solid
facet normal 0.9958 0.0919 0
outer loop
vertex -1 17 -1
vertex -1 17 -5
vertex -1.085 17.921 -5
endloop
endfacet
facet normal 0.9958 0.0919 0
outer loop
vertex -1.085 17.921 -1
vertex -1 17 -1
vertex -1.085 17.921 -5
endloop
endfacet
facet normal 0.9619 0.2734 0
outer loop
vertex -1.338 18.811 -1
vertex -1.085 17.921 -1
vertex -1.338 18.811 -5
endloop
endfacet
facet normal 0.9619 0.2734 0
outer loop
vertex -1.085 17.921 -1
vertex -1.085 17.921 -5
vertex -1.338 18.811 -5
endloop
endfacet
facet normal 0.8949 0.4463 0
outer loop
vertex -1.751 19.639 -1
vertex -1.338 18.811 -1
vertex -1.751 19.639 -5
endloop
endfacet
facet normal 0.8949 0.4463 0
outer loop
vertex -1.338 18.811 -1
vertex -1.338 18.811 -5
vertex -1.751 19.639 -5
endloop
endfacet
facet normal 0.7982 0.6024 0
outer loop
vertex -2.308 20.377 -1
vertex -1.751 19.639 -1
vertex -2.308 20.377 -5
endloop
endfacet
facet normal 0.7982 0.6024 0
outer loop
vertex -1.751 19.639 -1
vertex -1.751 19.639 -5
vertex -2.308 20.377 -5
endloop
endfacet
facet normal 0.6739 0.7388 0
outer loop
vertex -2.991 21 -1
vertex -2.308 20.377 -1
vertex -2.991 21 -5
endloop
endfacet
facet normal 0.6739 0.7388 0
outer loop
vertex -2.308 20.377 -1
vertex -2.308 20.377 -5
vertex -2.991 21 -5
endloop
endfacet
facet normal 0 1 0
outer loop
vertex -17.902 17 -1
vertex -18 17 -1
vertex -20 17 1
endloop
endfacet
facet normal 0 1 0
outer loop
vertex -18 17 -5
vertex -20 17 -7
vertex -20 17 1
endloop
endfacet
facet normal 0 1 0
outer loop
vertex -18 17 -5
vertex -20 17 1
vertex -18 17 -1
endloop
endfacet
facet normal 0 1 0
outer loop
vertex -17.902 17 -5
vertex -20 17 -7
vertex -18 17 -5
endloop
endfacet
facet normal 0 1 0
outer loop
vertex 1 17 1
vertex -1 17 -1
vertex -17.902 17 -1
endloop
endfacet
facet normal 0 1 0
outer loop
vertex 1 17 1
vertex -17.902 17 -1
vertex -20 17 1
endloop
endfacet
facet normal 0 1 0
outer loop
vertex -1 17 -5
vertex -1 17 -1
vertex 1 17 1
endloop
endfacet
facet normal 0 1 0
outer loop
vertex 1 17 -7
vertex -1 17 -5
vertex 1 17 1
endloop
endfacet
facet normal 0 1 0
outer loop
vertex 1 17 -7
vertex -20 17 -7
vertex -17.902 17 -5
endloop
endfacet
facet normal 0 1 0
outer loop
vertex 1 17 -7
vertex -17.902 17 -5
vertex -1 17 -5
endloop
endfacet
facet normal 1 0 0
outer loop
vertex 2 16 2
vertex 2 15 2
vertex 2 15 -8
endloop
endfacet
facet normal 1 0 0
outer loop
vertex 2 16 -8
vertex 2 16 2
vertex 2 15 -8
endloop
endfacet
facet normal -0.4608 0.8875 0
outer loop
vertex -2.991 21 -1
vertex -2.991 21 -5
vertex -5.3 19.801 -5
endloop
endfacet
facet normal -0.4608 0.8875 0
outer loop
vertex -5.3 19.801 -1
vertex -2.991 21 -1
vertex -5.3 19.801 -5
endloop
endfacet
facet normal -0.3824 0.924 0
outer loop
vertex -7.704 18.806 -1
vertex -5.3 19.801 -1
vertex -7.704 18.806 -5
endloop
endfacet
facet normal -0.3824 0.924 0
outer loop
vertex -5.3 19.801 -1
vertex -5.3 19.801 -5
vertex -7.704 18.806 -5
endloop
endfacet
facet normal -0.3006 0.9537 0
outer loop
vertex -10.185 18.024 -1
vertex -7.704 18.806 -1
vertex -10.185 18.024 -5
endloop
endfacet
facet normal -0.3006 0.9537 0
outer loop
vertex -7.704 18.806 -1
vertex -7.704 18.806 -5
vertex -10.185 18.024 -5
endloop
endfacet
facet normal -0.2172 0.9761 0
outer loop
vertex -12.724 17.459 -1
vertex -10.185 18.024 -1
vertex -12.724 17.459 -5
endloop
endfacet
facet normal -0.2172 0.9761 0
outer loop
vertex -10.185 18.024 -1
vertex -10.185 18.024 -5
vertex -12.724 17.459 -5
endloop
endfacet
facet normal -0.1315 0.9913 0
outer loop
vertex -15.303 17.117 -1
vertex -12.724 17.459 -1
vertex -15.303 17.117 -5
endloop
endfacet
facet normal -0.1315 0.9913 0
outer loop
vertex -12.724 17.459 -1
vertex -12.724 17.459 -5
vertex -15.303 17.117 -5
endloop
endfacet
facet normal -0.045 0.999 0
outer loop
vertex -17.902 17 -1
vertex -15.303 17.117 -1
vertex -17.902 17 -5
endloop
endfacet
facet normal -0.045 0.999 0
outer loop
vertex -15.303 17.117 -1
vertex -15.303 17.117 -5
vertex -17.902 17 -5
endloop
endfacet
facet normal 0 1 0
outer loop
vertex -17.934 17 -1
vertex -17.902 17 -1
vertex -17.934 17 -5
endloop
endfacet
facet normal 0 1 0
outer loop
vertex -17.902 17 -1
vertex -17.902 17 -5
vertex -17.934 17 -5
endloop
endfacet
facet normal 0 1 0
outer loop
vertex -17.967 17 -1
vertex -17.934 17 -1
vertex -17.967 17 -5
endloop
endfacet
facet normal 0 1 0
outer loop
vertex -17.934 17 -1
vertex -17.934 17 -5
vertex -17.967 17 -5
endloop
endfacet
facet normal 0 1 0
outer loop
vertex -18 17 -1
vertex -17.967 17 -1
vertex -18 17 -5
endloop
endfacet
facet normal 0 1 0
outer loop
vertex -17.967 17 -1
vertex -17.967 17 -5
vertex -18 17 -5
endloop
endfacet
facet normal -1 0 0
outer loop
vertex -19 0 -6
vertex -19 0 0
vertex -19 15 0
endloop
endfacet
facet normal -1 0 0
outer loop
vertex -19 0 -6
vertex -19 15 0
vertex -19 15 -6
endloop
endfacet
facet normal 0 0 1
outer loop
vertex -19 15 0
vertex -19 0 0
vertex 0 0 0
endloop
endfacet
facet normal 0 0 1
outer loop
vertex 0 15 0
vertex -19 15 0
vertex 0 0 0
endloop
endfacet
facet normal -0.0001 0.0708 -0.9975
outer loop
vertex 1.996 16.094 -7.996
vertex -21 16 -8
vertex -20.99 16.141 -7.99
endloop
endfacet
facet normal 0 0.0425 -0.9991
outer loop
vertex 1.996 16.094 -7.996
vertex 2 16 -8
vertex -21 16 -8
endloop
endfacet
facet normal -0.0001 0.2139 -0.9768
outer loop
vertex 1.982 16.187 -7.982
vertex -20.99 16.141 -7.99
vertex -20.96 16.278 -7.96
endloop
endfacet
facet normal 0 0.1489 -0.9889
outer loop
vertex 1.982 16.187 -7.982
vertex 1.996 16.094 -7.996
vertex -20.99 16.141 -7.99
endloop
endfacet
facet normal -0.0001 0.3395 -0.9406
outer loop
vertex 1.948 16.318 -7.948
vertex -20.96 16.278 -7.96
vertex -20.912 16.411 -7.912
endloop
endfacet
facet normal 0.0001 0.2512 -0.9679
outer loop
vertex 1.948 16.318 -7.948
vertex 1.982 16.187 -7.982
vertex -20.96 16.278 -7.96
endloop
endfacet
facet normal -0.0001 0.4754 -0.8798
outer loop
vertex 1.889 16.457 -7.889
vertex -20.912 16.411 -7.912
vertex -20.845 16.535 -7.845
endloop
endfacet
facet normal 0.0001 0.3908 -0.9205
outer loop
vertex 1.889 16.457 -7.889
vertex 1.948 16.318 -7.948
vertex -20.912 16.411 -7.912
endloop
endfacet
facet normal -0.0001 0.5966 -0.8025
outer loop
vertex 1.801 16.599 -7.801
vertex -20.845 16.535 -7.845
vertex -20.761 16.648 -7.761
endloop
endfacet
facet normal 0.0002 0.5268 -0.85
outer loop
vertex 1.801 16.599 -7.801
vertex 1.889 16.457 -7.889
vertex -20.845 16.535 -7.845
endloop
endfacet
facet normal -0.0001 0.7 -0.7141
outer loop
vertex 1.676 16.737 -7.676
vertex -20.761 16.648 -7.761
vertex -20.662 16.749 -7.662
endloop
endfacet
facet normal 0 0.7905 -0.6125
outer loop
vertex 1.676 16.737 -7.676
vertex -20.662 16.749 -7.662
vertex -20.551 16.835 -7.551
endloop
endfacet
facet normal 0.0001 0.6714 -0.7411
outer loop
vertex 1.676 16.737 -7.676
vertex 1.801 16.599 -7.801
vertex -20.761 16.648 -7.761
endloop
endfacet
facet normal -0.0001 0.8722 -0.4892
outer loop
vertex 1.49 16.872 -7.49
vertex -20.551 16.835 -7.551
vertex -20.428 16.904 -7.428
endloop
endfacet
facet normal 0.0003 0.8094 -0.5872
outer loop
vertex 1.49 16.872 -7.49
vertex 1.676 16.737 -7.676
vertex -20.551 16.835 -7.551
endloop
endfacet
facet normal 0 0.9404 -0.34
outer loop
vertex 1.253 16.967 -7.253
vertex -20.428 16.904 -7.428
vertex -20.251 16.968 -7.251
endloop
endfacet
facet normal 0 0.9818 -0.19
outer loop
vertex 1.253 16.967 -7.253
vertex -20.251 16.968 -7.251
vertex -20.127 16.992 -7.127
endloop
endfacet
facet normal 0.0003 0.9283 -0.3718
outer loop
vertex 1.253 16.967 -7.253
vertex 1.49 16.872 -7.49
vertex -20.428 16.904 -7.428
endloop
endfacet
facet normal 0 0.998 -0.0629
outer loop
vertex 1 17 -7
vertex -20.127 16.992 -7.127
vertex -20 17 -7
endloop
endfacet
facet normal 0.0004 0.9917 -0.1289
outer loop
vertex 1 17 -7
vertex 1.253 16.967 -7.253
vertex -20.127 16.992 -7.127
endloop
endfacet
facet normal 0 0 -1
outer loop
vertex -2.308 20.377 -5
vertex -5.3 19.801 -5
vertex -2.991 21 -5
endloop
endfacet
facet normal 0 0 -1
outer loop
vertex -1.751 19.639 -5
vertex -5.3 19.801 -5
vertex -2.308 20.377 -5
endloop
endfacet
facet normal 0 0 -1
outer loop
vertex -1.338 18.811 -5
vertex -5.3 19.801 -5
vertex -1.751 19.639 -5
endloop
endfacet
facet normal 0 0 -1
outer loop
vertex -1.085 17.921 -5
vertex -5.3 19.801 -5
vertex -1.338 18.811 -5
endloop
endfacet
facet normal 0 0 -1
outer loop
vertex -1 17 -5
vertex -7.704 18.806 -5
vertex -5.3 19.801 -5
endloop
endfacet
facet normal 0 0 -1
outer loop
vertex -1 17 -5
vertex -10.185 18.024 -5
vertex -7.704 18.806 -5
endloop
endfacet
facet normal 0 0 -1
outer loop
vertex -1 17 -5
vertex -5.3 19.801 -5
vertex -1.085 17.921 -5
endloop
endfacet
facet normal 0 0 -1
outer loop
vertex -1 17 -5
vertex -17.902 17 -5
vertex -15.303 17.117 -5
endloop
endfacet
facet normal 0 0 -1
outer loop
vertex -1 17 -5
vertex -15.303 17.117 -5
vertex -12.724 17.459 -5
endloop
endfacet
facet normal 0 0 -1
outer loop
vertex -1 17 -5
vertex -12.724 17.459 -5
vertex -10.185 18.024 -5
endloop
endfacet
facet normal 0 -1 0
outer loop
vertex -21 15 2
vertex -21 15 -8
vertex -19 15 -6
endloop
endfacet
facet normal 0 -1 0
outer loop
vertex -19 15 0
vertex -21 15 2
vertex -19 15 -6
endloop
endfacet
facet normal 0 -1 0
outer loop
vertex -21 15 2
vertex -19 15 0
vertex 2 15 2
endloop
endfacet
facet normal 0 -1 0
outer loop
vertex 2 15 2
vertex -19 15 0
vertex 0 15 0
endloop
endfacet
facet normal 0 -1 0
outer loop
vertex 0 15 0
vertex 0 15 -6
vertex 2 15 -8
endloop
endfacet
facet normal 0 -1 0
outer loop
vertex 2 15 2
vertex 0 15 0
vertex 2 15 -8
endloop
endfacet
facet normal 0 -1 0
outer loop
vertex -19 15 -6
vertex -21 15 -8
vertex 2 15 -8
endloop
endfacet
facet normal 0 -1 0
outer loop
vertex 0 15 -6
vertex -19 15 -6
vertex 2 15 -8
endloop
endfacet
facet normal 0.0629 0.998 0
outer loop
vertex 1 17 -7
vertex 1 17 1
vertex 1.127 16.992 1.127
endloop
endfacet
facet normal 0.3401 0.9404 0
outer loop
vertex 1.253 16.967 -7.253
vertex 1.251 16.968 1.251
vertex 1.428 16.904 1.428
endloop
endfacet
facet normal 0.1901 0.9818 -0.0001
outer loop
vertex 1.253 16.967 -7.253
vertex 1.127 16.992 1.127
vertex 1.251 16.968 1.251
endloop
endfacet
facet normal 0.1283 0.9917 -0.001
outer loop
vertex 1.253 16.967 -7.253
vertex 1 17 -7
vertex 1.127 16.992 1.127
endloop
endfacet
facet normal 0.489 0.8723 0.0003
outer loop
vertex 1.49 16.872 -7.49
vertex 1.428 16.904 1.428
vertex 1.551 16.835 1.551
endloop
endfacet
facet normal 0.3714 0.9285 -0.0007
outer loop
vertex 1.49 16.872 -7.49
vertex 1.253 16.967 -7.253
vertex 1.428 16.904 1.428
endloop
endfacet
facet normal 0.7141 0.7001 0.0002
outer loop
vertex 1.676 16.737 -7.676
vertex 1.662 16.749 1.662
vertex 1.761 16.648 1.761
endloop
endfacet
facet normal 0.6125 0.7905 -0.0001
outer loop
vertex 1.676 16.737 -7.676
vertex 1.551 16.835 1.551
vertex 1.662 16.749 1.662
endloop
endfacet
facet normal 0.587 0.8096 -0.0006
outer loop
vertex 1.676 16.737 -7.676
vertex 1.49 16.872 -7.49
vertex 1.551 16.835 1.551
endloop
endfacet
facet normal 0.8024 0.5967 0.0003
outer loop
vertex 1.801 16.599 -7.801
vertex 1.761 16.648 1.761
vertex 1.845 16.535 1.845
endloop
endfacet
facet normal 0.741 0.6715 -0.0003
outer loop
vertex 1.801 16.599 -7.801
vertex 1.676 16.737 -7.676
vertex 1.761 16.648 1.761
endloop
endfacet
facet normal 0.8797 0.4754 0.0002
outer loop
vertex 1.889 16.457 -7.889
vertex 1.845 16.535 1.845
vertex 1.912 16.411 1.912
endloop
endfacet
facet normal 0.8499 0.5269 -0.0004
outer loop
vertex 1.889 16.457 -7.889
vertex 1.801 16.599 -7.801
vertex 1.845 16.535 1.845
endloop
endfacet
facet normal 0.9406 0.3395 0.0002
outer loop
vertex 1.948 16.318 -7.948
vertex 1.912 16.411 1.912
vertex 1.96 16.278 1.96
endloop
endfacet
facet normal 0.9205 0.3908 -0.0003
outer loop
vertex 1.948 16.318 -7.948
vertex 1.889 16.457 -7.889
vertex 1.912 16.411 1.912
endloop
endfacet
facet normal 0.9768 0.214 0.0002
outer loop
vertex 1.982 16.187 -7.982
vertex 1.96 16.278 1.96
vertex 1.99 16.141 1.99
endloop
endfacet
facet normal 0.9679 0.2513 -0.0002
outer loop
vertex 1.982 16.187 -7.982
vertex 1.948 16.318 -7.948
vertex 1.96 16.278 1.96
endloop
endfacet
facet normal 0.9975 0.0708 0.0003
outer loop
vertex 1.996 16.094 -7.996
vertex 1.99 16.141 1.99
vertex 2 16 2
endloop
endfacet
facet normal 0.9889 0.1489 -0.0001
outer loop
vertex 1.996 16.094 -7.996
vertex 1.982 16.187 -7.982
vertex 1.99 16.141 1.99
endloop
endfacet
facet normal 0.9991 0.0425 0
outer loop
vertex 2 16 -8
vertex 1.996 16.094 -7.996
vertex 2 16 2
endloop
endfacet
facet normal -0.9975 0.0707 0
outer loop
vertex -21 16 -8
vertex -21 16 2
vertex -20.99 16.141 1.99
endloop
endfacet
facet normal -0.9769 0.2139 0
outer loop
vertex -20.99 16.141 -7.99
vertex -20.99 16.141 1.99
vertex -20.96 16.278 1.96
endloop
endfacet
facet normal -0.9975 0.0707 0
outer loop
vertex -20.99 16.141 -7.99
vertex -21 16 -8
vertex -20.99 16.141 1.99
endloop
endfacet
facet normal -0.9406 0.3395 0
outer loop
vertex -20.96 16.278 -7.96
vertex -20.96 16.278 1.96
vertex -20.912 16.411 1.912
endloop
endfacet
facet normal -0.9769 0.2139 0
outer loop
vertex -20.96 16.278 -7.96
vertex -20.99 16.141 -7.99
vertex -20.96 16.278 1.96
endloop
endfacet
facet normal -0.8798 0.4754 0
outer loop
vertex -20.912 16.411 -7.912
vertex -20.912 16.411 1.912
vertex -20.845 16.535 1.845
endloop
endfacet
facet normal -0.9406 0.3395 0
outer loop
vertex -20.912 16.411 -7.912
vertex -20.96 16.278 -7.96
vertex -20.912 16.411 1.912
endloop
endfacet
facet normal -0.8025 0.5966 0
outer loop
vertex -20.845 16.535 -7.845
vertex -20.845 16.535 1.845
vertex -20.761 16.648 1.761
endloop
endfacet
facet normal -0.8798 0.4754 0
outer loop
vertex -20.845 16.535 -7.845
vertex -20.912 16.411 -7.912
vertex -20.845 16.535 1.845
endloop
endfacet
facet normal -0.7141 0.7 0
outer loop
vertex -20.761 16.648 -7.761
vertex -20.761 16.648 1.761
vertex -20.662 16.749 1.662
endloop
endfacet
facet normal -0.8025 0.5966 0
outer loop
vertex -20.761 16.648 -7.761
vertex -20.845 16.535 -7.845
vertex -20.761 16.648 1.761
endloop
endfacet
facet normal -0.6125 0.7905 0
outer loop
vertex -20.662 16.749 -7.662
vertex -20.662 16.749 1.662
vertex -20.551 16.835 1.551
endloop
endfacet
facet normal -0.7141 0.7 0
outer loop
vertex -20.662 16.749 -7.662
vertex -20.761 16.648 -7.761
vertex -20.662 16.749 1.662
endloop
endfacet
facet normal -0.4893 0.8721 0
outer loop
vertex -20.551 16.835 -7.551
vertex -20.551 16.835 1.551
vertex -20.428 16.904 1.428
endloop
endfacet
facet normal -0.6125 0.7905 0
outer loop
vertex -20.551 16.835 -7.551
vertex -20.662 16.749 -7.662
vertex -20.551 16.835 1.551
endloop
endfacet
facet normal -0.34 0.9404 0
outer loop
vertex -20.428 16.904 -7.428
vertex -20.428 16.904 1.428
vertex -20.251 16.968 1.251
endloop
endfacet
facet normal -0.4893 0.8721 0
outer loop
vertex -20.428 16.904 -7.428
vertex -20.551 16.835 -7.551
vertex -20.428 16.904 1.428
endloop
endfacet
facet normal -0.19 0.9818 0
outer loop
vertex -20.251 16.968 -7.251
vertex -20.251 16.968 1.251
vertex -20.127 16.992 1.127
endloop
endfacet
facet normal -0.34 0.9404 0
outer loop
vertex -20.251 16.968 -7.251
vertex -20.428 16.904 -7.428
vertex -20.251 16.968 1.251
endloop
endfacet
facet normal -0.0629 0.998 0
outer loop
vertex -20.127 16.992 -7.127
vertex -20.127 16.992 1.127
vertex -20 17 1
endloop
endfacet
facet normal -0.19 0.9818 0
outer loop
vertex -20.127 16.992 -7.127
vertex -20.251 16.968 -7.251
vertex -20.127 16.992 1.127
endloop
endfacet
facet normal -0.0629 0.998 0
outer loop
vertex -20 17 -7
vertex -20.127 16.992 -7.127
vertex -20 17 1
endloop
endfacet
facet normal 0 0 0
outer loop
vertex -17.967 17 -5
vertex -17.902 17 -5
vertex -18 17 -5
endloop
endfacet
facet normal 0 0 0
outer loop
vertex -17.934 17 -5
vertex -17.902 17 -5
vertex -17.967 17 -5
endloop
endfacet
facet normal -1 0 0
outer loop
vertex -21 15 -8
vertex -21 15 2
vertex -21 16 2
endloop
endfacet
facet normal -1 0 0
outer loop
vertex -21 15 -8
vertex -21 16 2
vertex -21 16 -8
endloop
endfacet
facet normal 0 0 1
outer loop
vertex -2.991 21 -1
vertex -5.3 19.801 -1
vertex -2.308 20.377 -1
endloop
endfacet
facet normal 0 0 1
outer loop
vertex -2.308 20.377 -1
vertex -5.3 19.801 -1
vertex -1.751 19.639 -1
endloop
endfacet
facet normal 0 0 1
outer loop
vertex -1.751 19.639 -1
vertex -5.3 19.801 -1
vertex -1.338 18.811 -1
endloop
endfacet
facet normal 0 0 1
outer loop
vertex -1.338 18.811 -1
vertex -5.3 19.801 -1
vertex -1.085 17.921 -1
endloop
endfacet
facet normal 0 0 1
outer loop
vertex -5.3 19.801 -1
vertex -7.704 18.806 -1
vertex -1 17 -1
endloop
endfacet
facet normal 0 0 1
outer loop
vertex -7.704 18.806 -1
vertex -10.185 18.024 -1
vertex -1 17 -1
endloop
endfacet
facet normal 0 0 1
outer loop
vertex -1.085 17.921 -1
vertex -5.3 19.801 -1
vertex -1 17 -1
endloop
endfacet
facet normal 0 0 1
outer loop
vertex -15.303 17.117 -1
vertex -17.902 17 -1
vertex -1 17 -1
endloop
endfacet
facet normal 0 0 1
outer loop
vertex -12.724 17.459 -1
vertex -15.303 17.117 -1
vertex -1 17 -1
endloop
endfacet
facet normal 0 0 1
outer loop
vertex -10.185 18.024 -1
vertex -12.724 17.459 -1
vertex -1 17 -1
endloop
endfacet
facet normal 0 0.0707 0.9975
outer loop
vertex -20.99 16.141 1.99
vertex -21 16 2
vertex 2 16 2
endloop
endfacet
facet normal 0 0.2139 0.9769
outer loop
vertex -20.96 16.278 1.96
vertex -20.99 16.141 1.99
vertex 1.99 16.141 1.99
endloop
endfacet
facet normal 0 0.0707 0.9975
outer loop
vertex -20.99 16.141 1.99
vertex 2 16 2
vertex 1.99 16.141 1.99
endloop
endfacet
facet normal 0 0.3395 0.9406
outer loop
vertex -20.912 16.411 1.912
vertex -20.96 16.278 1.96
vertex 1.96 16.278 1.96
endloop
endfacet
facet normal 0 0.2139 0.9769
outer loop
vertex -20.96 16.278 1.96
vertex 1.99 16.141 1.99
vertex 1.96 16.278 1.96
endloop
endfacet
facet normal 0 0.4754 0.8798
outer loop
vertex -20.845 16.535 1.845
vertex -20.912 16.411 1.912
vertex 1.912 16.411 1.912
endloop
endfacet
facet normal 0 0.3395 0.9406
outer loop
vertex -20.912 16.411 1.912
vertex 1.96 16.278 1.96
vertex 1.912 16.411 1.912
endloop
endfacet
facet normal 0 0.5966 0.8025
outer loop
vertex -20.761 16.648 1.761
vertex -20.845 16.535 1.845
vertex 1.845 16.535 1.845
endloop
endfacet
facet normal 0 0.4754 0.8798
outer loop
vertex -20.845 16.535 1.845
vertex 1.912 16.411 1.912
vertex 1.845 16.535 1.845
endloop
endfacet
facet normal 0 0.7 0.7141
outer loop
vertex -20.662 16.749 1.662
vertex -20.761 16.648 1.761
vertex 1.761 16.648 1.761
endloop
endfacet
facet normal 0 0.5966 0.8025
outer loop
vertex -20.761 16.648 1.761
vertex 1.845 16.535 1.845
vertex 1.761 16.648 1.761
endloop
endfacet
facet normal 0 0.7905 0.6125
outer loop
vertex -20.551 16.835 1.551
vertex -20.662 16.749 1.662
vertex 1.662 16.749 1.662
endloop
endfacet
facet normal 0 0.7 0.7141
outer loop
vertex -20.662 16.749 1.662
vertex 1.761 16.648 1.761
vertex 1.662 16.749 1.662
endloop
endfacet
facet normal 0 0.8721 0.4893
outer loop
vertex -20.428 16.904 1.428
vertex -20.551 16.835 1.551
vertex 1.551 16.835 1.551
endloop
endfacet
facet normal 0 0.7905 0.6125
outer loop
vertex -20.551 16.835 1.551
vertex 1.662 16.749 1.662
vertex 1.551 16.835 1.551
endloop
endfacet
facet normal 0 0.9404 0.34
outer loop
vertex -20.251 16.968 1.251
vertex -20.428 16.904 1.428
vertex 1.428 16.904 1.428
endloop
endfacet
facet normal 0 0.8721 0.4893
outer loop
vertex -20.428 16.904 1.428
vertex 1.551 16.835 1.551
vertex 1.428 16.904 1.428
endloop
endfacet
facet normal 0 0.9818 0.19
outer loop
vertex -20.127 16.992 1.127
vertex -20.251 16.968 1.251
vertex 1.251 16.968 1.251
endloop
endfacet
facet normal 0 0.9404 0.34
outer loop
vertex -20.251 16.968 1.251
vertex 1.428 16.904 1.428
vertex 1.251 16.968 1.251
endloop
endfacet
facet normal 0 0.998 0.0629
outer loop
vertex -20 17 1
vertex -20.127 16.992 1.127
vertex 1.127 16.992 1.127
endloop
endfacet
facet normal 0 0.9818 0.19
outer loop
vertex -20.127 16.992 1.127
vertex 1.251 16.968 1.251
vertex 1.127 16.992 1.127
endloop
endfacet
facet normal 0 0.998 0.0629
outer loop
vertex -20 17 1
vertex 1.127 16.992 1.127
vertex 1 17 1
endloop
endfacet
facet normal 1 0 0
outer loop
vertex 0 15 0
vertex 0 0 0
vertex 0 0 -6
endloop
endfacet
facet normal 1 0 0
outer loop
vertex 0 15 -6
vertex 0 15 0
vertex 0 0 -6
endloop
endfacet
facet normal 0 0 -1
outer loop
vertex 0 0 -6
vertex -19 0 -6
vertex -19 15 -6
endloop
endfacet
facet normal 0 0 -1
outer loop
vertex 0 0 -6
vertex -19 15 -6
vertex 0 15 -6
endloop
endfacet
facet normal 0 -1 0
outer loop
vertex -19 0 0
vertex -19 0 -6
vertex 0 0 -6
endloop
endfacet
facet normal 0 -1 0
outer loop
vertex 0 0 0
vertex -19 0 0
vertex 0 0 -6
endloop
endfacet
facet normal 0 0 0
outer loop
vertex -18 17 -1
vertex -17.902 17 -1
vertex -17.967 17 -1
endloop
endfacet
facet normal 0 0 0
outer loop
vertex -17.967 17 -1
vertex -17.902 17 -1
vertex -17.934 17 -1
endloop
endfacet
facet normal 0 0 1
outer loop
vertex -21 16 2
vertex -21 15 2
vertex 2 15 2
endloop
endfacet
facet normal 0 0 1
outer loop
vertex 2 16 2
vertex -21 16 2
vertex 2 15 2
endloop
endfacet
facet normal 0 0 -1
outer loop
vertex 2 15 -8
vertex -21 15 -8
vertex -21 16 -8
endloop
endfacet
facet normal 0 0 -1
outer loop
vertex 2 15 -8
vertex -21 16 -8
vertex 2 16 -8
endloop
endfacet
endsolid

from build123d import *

# Parameters (mm, degrees)
SKETCH1_W           = 19
SKETCH1_H           = 6
BOSS_EXTRUDE1_DEPTH = 15
SKETCH2_W           = 23
SKETCH2_H           = 10
BOSS_EXTRUDE2_DEPTH = 2
SKETCH3_W           = 17
SKETCH3_H           = 4
BOSS_EXTRUDE3_DEPTH = 4
CUT_EXTRUDE1_DEPTH  = 4
FILLET1_R           = 1


with BuildPart() as part:
    # Sketch1 → Boss-Extrude1 (new body)
    with BuildSketch(Plane(origin=(0, 0, 0), x_dir=(1, 0, 0), z_dir=(0, 1, 0))):
        with Locations((-9.5, 3)):
            Rectangle(SKETCH1_W, SKETCH1_H)
    extrude(amount=BOSS_EXTRUDE1_DEPTH)

    # Sketch2 → Boss-Extrude2 (add)
    with BuildSketch(Plane(origin=(0, 15, 0), x_dir=(1, 0, 0), z_dir=(0, 1, 0))):
        with Locations((-9.5, 3)):
            Rectangle(SKETCH2_W, SKETCH2_H)
    extrude(amount=BOSS_EXTRUDE2_DEPTH)

    # Sketch3 → Boss-Extrude3 (add)
    with BuildSketch(Plane(origin=(0, 17, 0), x_dir=(1, 0, 0), z_dir=(0, 1, 0))):
        with Locations((-9.5, 3)):
            Rectangle(SKETCH3_W, SKETCH3_H)
    extrude(amount=BOSS_EXTRUDE3_DEPTH)

    # Sketch4 → Cut-Extrude1 (cut)
    with BuildSketch(Plane(origin=(0, 0, -5), x_dir=(-1, 0, 0), z_dir=(0, 0, -1))):
        with BuildLine():
            Line((1, 21), (1, 17))
            ThreePointArc((1, 17), (1.525373828, 19.234142662), (2.991374837, 21))
            Line((2.991374837, 21), (1, 21))
        make_face()
        with BuildLine():
            ThreePointArc((2.991374837, 21), (10.232075784, 18.010887947), (18, 17))
            Line((18, 17), (18, 21))
            Line((18, 21), (2.991374837, 21))
        make_face()
    extrude(amount=-CUT_EXTRUDE1_DEPTH, mode=Mode.SUBTRACT)

    # Fillet1
    fillet1_edges = [part.edges().sort_by_distance(p)[0] for p in [
        (-21, 17, -3),
        (-9.5, 17, 2),
        (2, 17, -3),
        (-9.5, 17, -8),
    ]]
    fillet(fillet1_edges, radius=FILLET1_R)


solid = part.part
